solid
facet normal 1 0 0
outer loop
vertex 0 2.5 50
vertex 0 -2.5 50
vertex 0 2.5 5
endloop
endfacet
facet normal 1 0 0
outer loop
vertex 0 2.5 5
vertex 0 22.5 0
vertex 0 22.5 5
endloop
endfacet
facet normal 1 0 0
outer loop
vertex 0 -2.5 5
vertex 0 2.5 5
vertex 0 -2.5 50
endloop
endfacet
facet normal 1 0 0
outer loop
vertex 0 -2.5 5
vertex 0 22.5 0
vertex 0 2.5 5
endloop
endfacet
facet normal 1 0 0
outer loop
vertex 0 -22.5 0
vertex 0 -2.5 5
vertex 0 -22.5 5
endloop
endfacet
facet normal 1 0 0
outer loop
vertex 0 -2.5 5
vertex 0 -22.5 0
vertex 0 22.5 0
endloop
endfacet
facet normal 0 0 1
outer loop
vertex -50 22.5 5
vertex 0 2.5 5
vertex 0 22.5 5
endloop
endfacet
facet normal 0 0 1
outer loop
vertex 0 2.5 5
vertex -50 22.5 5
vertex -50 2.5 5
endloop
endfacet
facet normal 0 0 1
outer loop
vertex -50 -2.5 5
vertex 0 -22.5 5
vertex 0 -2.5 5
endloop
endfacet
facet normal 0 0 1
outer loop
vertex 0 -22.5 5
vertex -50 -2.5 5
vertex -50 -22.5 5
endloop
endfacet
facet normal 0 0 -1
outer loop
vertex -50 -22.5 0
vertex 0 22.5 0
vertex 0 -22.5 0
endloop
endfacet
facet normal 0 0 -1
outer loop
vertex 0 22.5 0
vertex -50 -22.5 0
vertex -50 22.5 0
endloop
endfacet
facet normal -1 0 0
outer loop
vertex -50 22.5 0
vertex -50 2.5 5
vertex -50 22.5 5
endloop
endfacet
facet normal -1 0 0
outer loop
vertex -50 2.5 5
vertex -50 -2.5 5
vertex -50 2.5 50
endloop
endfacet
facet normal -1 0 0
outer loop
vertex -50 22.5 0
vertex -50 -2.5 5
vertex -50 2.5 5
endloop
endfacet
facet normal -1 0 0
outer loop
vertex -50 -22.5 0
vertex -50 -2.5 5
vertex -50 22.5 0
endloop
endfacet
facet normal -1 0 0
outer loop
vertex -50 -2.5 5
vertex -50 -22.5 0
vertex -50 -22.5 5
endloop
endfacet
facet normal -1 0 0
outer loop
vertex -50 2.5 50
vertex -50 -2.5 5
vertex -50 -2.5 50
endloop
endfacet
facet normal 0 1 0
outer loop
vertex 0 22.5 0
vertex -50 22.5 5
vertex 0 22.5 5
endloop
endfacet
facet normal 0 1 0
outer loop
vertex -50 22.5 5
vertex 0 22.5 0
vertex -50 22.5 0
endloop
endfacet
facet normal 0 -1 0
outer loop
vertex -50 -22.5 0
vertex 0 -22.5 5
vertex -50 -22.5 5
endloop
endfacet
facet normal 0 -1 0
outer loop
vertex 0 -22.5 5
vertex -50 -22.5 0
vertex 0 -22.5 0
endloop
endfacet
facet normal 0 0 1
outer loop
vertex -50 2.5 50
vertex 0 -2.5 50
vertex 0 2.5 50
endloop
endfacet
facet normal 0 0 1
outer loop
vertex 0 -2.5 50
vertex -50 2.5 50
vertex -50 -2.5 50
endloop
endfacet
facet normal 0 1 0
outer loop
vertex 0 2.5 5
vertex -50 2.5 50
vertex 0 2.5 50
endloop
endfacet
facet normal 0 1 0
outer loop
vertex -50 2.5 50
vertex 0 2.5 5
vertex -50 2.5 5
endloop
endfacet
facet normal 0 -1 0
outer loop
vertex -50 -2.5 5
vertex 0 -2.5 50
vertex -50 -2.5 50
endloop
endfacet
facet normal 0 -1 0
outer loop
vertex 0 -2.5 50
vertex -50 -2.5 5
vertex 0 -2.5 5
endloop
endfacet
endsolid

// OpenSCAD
// Built by bench/smallmodels/features/compiler.py from a list of features.
$fn = 64;
difference() {
  union() {
    translate([-25, 0, 0]) translate([-25, -22.5, 0]) cube([50, 45, 5]);
    translate([-25, 0, 0]) translate([-25, -2.5, 0]) cube([50, 5, 50]);
  }
  union() {
    translate([-17, 30, 3.75]) rotate([0, 0, 0]) rotate([0, 90, 0]) cylinder(d = 4.5, h = 1200, center = true);
    translate([17, 30, 3.75]) rotate([0, 0, 0]) rotate([0, 90, 0]) cylinder(d = 4.5, h = 1200, center = true);
  }
}
